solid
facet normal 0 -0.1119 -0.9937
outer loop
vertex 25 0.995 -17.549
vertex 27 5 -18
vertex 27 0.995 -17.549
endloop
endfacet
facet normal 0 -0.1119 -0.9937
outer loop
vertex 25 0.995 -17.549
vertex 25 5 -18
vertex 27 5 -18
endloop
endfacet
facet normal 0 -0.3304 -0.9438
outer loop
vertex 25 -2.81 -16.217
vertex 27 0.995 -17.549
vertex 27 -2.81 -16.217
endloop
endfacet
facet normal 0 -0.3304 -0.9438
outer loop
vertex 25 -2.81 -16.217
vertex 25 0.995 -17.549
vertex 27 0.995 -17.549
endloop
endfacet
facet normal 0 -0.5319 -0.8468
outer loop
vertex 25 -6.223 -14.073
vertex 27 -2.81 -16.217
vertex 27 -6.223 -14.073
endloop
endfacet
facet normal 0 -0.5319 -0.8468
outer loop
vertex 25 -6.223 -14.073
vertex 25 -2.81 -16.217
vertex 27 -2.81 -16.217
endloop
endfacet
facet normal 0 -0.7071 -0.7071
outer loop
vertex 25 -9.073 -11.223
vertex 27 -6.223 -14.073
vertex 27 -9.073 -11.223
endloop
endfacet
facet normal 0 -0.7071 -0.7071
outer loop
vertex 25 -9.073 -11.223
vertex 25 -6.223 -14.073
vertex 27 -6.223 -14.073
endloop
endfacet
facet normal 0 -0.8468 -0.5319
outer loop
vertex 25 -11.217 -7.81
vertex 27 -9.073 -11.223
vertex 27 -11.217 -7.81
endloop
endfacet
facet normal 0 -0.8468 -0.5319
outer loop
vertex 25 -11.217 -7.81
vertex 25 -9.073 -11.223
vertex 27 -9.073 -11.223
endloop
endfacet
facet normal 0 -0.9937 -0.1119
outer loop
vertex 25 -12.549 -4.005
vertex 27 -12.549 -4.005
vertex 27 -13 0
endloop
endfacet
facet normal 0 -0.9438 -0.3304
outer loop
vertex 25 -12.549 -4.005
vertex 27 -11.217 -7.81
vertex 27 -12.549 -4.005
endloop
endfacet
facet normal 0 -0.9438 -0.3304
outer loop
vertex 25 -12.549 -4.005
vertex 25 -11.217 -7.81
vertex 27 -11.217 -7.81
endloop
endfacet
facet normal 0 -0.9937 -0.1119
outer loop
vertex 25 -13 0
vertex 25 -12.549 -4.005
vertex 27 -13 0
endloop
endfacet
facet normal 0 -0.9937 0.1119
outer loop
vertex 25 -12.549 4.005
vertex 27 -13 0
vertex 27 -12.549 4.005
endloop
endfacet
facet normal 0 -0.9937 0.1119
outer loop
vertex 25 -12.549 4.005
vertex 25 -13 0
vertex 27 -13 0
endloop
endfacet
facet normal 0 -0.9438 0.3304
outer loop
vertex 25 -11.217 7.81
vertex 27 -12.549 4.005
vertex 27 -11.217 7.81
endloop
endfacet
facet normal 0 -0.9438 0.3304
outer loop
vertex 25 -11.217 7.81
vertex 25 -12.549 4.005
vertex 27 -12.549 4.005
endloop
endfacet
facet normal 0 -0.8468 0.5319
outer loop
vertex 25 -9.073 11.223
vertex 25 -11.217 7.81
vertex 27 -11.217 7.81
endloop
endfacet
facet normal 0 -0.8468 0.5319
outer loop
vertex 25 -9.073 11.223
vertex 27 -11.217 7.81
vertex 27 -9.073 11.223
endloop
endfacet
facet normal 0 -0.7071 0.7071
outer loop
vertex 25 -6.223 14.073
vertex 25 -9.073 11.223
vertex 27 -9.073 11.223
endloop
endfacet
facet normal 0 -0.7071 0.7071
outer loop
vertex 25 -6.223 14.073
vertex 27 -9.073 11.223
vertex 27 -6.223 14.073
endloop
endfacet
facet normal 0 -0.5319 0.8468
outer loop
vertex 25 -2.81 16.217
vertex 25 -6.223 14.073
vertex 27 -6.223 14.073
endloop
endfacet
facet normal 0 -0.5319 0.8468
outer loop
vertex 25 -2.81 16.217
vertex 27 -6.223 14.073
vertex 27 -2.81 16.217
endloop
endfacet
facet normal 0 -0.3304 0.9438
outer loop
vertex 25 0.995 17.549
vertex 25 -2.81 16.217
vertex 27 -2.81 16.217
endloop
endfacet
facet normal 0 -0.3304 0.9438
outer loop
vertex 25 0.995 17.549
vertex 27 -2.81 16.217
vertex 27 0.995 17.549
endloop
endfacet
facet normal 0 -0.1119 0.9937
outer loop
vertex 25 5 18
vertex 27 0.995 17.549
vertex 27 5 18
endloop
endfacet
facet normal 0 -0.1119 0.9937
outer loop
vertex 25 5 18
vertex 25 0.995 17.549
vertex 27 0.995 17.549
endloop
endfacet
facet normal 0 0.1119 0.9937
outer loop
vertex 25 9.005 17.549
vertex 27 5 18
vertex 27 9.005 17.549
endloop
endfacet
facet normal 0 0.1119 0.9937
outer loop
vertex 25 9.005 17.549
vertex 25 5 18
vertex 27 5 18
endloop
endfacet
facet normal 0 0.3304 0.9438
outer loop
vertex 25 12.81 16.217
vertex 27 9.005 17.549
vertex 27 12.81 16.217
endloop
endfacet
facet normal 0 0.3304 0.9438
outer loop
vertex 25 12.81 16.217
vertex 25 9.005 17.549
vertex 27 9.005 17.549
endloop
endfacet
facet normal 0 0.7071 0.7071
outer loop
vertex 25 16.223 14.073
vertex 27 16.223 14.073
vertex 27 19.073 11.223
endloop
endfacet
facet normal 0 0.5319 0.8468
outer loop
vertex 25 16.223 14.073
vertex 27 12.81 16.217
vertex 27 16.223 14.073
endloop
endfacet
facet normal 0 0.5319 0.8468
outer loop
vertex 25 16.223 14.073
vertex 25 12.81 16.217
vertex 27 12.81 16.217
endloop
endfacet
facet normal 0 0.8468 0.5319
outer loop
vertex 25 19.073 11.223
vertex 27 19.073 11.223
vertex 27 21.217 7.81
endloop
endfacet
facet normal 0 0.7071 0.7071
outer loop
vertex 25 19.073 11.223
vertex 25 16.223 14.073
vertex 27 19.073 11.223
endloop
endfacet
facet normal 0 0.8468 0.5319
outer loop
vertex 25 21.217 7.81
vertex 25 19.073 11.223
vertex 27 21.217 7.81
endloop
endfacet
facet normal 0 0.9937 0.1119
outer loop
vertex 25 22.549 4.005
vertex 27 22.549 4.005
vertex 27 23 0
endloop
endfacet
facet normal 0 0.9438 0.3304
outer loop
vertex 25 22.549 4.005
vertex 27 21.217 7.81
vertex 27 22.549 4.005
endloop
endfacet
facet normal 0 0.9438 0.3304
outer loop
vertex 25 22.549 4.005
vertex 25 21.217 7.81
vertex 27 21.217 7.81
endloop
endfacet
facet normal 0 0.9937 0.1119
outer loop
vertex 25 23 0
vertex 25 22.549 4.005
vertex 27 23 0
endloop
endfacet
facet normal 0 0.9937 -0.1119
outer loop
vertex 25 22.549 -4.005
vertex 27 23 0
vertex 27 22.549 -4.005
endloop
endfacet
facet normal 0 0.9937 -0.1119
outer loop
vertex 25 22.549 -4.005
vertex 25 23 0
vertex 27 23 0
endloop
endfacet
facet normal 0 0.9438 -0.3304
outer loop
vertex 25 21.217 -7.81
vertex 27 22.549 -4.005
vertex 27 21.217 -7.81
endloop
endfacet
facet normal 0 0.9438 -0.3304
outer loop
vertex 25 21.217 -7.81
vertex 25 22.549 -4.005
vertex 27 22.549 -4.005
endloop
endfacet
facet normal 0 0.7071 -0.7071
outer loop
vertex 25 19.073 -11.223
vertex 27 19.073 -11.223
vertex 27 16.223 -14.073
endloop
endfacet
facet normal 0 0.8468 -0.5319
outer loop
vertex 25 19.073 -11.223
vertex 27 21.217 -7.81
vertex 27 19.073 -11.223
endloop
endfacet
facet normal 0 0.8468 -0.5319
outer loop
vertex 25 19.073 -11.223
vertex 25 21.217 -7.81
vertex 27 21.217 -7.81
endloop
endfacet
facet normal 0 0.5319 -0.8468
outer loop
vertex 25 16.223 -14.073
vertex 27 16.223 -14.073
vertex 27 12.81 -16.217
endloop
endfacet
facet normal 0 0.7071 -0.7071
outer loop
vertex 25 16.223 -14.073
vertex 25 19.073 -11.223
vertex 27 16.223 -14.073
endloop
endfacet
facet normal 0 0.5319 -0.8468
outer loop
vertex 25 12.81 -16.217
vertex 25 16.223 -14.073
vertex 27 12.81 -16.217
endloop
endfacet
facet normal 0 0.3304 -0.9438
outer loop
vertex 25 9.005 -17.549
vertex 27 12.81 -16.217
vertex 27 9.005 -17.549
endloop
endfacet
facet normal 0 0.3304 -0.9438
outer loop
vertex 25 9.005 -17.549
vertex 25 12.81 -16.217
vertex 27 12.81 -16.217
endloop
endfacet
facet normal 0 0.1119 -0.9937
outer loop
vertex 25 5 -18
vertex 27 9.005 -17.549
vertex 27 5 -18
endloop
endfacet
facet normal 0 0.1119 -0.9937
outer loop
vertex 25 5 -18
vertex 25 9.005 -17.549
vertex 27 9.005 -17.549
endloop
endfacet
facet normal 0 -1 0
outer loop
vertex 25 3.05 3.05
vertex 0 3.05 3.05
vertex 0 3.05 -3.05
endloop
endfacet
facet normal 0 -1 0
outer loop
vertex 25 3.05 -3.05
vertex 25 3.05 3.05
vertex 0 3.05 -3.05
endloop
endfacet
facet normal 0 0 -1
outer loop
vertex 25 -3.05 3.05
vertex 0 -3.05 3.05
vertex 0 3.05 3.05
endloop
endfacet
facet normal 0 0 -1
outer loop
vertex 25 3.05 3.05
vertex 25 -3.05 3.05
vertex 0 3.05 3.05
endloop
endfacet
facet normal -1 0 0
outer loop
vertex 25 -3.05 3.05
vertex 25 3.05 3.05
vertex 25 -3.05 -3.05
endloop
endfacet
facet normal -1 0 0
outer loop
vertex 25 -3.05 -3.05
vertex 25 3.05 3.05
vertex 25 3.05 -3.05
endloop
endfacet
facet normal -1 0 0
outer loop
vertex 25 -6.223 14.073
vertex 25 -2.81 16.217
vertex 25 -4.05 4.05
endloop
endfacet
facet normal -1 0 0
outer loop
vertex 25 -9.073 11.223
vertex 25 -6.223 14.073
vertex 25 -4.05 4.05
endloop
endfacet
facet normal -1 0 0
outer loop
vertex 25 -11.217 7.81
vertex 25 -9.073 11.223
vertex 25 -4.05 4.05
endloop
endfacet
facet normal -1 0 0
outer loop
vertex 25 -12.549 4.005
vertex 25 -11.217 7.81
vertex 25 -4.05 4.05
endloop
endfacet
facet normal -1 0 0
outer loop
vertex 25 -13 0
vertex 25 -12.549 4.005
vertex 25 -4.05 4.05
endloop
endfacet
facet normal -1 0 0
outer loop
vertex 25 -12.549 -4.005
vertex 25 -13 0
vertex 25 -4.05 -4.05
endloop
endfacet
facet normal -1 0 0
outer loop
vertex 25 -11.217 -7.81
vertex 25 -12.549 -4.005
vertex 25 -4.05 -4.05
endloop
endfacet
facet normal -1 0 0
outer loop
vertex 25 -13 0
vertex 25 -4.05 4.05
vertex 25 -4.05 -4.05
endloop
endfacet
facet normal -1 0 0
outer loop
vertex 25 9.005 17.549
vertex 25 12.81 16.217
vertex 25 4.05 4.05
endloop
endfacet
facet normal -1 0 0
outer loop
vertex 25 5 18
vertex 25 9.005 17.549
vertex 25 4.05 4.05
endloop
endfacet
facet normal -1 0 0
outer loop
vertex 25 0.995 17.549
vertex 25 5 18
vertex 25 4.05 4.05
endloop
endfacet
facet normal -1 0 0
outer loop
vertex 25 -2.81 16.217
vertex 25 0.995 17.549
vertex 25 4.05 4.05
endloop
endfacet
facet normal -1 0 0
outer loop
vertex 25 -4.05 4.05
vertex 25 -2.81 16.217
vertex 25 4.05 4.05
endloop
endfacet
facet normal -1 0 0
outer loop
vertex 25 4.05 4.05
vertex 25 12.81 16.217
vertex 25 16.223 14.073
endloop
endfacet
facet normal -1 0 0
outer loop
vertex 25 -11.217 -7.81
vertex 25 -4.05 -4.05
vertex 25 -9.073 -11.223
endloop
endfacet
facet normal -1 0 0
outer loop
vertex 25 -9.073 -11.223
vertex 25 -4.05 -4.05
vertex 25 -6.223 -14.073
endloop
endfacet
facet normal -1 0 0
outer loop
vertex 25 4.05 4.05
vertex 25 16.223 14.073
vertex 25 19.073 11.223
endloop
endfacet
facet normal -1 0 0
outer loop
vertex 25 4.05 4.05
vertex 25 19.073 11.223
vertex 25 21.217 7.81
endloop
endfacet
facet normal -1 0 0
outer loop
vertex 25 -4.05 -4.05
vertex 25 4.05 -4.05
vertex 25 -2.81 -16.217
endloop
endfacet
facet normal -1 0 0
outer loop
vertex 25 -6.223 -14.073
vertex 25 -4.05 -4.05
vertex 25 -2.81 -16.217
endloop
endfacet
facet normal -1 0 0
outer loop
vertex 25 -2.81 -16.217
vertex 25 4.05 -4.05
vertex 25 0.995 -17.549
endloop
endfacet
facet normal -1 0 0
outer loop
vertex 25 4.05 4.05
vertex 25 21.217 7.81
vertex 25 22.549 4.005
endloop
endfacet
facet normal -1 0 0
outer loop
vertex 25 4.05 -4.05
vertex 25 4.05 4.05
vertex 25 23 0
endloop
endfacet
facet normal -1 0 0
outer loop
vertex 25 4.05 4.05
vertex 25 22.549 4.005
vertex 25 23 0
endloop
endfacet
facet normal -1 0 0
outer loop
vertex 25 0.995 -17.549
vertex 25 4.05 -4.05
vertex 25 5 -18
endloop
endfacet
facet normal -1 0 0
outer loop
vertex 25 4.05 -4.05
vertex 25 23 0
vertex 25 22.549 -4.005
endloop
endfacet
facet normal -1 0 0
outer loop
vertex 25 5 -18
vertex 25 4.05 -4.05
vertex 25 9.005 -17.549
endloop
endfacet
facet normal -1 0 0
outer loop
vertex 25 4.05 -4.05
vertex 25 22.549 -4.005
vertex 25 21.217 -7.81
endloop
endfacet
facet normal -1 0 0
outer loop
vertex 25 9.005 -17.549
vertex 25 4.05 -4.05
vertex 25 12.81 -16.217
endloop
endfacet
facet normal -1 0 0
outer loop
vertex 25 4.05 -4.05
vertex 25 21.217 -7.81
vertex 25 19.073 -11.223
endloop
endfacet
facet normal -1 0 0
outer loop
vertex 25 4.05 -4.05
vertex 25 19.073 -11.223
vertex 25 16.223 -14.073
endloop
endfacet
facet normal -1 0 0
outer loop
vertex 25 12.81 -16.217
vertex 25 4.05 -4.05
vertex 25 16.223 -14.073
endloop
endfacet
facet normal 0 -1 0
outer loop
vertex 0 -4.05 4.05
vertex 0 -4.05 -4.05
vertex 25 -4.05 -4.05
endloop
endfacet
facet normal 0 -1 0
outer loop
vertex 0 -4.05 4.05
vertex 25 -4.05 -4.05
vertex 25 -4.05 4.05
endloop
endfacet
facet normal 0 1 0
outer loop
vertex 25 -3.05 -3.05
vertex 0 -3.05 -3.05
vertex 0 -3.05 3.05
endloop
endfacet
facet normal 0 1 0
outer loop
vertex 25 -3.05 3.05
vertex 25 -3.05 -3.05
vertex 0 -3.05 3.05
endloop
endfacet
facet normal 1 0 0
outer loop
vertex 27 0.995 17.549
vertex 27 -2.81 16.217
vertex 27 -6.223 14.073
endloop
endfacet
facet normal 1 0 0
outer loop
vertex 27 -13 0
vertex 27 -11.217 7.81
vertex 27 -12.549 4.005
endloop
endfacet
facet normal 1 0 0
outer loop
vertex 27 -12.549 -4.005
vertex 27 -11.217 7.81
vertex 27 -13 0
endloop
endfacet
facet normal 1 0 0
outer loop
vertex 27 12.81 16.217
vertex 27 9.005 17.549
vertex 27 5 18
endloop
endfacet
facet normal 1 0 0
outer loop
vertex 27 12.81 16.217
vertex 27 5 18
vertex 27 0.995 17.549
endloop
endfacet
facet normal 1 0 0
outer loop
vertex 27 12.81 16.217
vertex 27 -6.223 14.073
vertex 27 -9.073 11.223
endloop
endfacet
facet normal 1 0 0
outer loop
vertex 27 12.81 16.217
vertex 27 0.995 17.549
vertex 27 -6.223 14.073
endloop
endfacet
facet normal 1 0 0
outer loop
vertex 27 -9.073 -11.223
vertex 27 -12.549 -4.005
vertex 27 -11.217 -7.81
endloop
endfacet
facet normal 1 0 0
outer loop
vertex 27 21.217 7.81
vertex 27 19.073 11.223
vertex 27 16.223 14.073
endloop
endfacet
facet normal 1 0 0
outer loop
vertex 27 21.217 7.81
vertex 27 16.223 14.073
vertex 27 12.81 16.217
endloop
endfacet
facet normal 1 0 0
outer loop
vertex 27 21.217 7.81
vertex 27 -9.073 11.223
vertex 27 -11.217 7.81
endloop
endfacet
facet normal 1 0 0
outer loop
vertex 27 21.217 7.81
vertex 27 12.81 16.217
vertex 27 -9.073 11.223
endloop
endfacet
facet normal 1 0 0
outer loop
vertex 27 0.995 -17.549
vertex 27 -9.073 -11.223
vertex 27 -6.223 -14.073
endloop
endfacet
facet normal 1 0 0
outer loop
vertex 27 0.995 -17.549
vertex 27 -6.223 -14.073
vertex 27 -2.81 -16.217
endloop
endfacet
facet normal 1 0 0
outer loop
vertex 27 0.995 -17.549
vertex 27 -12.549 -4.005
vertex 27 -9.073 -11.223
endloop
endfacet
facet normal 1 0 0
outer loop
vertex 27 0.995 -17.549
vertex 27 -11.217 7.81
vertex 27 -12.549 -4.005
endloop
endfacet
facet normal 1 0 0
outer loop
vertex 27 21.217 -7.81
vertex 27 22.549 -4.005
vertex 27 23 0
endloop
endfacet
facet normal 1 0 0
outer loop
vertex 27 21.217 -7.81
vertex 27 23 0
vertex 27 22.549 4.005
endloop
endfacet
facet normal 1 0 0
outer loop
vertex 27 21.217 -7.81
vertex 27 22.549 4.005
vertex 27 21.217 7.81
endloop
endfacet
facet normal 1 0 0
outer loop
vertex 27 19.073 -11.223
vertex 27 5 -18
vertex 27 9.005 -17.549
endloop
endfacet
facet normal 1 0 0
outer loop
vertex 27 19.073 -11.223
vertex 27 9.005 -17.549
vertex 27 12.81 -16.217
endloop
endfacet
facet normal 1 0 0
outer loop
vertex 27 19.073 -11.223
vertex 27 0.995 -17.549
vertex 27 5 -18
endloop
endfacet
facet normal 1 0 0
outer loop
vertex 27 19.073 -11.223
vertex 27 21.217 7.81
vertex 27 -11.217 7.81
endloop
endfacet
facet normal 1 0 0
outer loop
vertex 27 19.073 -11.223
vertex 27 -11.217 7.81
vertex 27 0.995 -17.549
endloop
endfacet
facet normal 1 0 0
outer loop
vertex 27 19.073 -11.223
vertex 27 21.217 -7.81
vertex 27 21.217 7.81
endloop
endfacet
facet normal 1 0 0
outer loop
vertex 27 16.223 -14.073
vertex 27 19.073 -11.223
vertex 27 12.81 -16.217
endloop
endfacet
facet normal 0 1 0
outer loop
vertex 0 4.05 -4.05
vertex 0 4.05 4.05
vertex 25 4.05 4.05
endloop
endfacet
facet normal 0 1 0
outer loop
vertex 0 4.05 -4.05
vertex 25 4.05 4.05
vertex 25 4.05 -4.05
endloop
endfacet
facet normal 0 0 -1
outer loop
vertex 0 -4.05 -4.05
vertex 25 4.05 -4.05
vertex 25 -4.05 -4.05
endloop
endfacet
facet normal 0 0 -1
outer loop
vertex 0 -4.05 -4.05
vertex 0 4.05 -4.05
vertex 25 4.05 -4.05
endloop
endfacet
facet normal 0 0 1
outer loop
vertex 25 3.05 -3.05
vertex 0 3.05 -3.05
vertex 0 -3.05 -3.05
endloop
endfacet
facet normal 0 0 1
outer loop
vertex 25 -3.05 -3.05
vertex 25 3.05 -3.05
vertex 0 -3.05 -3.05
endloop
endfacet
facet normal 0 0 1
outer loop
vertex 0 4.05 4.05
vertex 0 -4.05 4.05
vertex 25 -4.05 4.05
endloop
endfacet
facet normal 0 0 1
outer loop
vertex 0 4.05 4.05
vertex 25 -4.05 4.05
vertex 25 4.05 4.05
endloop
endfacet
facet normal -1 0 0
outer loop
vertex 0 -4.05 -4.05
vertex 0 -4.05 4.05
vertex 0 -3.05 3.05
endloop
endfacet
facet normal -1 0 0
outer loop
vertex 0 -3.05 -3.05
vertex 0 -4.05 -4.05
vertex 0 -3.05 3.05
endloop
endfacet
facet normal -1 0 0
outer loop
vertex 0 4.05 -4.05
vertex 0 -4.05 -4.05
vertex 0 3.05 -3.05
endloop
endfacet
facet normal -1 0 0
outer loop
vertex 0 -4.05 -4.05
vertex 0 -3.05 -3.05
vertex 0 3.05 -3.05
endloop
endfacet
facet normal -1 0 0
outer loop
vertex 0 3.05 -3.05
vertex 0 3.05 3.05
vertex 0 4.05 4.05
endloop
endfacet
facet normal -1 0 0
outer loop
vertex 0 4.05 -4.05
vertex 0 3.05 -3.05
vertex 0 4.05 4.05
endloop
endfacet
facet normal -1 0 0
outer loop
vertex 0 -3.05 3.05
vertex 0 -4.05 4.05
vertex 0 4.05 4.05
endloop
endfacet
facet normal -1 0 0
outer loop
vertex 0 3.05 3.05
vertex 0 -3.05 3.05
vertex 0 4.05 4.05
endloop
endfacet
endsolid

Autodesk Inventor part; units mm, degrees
ref_plane "YZ Plane" through (0, 0, 0) normal (1, 0, 0) x (0, 1, 0)
ref_plane "XZ Plane" through (0, 0, 0) normal (0, 1, 0) x (-1, 0, 0)
ref_plane "XY Plane" through (0, 0, 0) normal (0, 0, 1) x (1, 0, 0)
sketch "Sketch3" plane through (0, 0, 0) normal (1, 0, 0) x (0, 1, 0)
  line L0 (3.05, -3.05) -> (-3.05, -3.05)
  line L1 (-3.05, -3.05) -> (-3.05, 3.05)
  line L2 (-3.05, 3.05) -> (3.05, 3.05)
  line L3 (3.05, 3.05) -> (3.05, -3.05)
  line L4 (3.05, -3.05) -> (-3.05, 3.05) construction
  line L5 (-3.05, -3.05) -> (3.05, 3.05) construction
  line L6 (4.05, -4.05) -> (-4.05, -4.05)
  line L7 (-4.05, -4.05) -> (-4.05, 4.05)
  line L8 (-4.05, 4.05) -> (4.05, 4.05)
  line L9 (4.05, 4.05) -> (4.05, -4.05)
  line L10 (4.05, -4.05) -> (-4.05, 4.05) construction
  line L11 (-4.05, -4.05) -> (4.05, 4.05) construction
  point P0 (0, 0)
  point P1 (0, 0)
  point P2 (0, 0)
  dimension "d38" = 8.1
  dimension "d39" = 8.1
  dimension "d40" = 6.1
  dimension "d41" = 6.1
extrude "Extrusion2" add sketch "Sketch3" along normal blind 25
sketch "Sketch9" plane through (25, 0, 0) normal (1, 0, 0) x (0, 0, -1)
  line L0 (-4.05, 4.05) -> (-4.05, -4.05) projected
  line L1 (-4.05, -4.05) -> (4.05, -4.05) projected
  line L2 (4.05, -4.05) -> (4.05, 4.05) projected
  line L3 (4.05, 4.05) -> (-4.05, 4.05) projected
  line L4 (3.05, 3.05) -> (3.05, -3.05) projected
  line L5 (3.05, -3.05) -> (-3.05, -3.05) projected
  line L6 (-3.05, -3.05) -> (-3.05, 3.05) projected
  line L7 (-3.05, 3.05) -> (3.05, 3.05) projected
  circle A0 centre (0, 5) radius 18
  line L8 (0, 0) -> (0, 9.371) construction
  dimension "d42" = 5
  dimension "d45" = 36
extrude "Extrusion6" add sketch "Sketch9" along normal blind 2 contours L3 L2 L1 L0 | L4 L5 L6 L7 | A0
equation "\"d39\" = d38"
properties part number "propellor_fuselage_interface" material "Nylon 6/6"
